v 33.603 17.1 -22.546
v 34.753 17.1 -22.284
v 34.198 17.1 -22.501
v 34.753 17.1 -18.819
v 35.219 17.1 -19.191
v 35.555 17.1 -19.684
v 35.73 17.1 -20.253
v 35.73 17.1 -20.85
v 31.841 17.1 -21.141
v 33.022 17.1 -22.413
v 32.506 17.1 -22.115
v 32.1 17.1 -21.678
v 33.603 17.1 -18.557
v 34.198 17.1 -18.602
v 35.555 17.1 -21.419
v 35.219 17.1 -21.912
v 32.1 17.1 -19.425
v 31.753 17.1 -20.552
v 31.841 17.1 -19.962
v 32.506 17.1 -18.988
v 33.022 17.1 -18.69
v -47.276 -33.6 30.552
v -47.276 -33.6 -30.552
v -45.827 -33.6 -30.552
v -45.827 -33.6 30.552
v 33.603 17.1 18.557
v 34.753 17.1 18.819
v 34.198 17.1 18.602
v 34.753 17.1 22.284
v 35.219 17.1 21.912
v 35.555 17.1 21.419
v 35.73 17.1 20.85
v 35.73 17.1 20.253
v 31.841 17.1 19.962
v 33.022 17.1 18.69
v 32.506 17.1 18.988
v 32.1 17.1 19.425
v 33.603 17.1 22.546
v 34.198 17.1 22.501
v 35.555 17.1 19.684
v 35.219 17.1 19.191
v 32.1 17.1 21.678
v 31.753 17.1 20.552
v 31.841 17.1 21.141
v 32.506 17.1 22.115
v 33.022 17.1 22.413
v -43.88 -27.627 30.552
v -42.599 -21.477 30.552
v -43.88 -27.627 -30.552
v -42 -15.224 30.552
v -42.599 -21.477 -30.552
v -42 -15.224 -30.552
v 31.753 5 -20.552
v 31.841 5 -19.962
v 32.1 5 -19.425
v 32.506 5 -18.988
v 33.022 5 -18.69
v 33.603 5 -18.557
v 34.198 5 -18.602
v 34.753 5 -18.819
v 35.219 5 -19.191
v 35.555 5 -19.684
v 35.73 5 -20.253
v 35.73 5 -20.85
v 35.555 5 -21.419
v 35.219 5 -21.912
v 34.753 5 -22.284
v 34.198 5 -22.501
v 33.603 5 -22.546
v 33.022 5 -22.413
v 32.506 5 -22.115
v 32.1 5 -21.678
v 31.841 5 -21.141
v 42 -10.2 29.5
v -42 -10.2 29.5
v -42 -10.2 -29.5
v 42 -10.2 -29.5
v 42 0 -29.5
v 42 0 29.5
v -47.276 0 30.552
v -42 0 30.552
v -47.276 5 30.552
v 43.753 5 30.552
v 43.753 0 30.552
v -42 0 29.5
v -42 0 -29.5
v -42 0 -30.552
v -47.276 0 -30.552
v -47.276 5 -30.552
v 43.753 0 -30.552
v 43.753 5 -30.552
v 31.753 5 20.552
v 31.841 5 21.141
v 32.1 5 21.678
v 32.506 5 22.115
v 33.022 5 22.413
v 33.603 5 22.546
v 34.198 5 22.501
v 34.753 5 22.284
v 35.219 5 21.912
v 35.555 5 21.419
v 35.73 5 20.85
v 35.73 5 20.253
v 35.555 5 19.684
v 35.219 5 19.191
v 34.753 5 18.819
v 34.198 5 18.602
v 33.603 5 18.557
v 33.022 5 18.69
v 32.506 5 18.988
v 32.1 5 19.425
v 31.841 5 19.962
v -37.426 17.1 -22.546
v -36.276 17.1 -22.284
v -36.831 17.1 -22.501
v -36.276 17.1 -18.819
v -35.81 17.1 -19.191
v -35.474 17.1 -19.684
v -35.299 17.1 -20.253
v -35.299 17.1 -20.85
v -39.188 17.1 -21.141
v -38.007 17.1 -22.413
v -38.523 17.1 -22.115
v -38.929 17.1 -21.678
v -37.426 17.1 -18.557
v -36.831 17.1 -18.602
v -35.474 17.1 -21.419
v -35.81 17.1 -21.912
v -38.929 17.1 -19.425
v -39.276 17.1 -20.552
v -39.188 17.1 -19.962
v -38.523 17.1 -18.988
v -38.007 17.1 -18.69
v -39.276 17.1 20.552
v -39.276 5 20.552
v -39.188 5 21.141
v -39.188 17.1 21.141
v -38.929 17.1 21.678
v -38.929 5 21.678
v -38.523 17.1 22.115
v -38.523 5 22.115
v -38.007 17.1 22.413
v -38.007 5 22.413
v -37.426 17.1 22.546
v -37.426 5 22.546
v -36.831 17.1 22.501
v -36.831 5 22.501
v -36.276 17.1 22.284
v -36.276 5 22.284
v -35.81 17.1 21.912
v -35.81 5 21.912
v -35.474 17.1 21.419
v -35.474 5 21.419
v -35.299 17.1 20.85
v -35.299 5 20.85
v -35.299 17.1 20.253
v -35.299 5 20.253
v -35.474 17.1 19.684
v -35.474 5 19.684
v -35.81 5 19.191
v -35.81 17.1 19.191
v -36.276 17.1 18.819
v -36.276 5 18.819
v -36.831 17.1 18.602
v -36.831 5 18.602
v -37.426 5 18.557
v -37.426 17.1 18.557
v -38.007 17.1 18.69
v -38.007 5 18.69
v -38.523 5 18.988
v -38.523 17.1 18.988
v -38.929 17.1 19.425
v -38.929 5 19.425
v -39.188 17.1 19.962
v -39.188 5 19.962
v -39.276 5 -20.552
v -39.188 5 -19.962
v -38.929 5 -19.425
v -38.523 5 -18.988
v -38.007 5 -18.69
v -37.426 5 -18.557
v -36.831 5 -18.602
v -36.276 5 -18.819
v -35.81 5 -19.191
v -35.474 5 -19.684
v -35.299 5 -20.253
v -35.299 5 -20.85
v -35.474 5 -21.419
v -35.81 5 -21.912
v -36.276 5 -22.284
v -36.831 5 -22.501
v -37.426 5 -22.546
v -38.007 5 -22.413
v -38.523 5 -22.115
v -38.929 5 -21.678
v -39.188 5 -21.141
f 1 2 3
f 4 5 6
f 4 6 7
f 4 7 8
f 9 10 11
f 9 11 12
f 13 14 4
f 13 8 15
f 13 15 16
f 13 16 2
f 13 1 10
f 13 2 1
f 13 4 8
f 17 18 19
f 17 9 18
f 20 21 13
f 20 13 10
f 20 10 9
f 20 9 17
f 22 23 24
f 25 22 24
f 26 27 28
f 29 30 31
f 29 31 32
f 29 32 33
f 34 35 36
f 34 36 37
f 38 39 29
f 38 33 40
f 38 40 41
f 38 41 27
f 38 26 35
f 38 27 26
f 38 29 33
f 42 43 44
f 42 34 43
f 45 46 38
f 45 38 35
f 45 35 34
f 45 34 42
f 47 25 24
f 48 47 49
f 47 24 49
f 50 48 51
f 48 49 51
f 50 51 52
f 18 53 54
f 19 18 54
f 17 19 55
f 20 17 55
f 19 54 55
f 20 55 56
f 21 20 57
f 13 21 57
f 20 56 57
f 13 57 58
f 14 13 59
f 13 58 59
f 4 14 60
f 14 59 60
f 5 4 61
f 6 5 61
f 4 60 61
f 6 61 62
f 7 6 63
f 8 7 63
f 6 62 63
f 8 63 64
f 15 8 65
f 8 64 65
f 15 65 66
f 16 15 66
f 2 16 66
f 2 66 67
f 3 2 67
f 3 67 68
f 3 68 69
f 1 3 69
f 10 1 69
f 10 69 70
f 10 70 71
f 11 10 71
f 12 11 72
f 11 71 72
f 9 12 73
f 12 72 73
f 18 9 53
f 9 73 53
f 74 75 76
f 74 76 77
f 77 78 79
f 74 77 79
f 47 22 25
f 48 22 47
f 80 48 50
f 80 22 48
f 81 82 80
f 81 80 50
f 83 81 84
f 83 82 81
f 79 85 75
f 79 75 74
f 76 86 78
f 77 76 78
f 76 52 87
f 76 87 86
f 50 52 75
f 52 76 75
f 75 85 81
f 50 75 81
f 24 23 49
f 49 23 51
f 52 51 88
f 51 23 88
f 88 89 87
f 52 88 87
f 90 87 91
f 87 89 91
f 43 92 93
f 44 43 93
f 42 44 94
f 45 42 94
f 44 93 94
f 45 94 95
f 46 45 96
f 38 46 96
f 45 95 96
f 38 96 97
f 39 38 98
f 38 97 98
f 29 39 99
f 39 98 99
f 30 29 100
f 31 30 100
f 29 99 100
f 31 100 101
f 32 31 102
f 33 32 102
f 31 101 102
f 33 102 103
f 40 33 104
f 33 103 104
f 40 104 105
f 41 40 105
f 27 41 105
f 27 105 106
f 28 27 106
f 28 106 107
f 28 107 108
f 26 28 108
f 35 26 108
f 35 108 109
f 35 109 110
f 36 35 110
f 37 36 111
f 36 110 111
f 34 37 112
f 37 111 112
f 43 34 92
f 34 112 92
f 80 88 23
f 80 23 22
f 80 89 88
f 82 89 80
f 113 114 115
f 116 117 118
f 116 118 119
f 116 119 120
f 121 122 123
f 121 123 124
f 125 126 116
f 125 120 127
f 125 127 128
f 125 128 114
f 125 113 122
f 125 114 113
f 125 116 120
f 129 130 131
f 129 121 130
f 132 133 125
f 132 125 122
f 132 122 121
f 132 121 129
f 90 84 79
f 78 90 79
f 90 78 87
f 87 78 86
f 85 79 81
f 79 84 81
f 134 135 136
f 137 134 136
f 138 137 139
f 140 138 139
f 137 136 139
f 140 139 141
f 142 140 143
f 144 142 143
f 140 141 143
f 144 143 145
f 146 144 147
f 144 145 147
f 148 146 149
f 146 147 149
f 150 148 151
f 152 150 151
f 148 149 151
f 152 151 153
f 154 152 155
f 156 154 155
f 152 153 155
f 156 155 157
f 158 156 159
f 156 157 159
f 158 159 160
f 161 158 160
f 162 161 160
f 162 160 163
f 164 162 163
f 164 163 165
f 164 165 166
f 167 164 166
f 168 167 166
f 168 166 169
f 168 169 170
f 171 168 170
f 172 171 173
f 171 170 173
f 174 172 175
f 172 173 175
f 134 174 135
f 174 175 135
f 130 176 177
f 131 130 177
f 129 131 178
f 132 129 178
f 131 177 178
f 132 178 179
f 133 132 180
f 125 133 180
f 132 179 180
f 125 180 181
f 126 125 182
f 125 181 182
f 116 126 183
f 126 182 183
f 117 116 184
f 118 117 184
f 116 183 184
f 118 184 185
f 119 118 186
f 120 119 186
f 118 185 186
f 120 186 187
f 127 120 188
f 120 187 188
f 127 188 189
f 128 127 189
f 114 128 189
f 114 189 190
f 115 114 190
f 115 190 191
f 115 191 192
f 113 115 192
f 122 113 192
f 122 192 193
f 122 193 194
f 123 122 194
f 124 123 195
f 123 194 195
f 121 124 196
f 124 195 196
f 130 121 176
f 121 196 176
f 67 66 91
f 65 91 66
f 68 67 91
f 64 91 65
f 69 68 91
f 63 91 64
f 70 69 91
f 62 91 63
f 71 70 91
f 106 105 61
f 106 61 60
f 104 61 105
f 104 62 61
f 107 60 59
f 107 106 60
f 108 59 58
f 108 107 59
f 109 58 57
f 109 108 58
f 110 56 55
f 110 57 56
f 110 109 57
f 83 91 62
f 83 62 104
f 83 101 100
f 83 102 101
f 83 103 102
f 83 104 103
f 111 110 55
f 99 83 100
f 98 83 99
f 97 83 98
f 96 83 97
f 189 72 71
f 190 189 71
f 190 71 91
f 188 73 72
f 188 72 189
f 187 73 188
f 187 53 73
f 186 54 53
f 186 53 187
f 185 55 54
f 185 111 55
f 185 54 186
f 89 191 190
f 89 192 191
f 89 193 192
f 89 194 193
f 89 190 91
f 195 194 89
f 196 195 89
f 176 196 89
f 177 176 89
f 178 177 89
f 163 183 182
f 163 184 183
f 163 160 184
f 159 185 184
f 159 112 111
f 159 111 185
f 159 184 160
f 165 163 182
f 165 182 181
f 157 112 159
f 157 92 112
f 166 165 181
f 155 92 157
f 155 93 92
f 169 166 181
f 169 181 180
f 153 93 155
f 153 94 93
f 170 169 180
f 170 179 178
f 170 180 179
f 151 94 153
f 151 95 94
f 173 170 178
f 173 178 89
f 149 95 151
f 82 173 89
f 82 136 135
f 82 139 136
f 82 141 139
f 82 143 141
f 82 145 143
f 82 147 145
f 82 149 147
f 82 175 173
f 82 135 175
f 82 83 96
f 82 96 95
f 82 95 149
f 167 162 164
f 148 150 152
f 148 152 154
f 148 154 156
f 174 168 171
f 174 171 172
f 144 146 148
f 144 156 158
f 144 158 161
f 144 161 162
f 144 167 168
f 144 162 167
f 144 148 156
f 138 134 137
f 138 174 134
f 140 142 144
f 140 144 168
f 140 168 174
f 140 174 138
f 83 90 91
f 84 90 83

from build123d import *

# Parameters (mm, degrees)
F0_W     = 84
F0_H     = 59
F1_DEPTH = 10.2
F2_W     = 87.5051617622
F2_H     = 61.1030906439
F2_W_2   = 3.5238564014
F3_DEPTH = 5
F4_W     = 5.2764372826
F4_H     = 61.1030906439
F5_DEPTH = 33.6
F7_DEPTH = 69.2
F8_R     = 2
F9_DEPTH = 12.1


with BuildPart() as f1:
    # F0 (on Front) → F1 (new body)
    with BuildSketch(Plane.XZ):
        Rectangle(F0_W, F0_H)
    extrude(amount=F1_DEPTH)

    # F2 (on face) → F3 (join)
    with BuildSketch(Plane(origin=(0, 0, 0), x_dir=(-1, 0, 0), z_dir=(0, 1, 0))):
        Rectangle(F2_W, F2_H)
        with Locations((45.5145090818, 0)):
            Rectangle(F2_W_2, F2_H)
    extrude(amount=F3_DEPTH)

    # F4 (on face) → F5 (join)
    with BuildSketch(Plane.XZ):
        with Locations((-44.6382186413, 0)):
            Rectangle(F4_W, F4_H)
    extrude(amount=F5_DEPTH)

    # F6 (on face) → F7 (cut)
    with BuildSketch(Plane(origin=(0, 0, -30.5515453219), x_dir=(1, 0, 0), z_dir=(0, 0, -1))):
        with BuildLine():
            ThreePointArc((-45.8268001676, 33.6), (-43.1548823666, 24.5698804652), (-42, 15.2238411829))
            Line((-42, 15.2238411829), (-42, 33.6))
            Line((-42, 33.6), (-45.8268001676, 33.6))
        make_face()
    extrude(amount=-F7_DEPTH, mode=Mode.SUBTRACT)

    # F8 (on face) → F9 (join)
    with BuildSketch(Plane(origin=(0, 5, 0), x_dir=(-1, 0, 0), z_dir=(0, 1, 0))):
        with Locations((-33.7525808811, 20.5515453219)):
            Circle(F8_R)
        with Locations((37.2764372826, 20.5515453219)):
            Circle(F8_R)
        with Locations((37.2764372826, -20.5515453219)):
            Circle(F8_R)
        with Locations((-33.7525808811, -20.5515453219)):
            Circle(F8_R)
    extrude(amount=F9_DEPTH)


solid = f1.part
